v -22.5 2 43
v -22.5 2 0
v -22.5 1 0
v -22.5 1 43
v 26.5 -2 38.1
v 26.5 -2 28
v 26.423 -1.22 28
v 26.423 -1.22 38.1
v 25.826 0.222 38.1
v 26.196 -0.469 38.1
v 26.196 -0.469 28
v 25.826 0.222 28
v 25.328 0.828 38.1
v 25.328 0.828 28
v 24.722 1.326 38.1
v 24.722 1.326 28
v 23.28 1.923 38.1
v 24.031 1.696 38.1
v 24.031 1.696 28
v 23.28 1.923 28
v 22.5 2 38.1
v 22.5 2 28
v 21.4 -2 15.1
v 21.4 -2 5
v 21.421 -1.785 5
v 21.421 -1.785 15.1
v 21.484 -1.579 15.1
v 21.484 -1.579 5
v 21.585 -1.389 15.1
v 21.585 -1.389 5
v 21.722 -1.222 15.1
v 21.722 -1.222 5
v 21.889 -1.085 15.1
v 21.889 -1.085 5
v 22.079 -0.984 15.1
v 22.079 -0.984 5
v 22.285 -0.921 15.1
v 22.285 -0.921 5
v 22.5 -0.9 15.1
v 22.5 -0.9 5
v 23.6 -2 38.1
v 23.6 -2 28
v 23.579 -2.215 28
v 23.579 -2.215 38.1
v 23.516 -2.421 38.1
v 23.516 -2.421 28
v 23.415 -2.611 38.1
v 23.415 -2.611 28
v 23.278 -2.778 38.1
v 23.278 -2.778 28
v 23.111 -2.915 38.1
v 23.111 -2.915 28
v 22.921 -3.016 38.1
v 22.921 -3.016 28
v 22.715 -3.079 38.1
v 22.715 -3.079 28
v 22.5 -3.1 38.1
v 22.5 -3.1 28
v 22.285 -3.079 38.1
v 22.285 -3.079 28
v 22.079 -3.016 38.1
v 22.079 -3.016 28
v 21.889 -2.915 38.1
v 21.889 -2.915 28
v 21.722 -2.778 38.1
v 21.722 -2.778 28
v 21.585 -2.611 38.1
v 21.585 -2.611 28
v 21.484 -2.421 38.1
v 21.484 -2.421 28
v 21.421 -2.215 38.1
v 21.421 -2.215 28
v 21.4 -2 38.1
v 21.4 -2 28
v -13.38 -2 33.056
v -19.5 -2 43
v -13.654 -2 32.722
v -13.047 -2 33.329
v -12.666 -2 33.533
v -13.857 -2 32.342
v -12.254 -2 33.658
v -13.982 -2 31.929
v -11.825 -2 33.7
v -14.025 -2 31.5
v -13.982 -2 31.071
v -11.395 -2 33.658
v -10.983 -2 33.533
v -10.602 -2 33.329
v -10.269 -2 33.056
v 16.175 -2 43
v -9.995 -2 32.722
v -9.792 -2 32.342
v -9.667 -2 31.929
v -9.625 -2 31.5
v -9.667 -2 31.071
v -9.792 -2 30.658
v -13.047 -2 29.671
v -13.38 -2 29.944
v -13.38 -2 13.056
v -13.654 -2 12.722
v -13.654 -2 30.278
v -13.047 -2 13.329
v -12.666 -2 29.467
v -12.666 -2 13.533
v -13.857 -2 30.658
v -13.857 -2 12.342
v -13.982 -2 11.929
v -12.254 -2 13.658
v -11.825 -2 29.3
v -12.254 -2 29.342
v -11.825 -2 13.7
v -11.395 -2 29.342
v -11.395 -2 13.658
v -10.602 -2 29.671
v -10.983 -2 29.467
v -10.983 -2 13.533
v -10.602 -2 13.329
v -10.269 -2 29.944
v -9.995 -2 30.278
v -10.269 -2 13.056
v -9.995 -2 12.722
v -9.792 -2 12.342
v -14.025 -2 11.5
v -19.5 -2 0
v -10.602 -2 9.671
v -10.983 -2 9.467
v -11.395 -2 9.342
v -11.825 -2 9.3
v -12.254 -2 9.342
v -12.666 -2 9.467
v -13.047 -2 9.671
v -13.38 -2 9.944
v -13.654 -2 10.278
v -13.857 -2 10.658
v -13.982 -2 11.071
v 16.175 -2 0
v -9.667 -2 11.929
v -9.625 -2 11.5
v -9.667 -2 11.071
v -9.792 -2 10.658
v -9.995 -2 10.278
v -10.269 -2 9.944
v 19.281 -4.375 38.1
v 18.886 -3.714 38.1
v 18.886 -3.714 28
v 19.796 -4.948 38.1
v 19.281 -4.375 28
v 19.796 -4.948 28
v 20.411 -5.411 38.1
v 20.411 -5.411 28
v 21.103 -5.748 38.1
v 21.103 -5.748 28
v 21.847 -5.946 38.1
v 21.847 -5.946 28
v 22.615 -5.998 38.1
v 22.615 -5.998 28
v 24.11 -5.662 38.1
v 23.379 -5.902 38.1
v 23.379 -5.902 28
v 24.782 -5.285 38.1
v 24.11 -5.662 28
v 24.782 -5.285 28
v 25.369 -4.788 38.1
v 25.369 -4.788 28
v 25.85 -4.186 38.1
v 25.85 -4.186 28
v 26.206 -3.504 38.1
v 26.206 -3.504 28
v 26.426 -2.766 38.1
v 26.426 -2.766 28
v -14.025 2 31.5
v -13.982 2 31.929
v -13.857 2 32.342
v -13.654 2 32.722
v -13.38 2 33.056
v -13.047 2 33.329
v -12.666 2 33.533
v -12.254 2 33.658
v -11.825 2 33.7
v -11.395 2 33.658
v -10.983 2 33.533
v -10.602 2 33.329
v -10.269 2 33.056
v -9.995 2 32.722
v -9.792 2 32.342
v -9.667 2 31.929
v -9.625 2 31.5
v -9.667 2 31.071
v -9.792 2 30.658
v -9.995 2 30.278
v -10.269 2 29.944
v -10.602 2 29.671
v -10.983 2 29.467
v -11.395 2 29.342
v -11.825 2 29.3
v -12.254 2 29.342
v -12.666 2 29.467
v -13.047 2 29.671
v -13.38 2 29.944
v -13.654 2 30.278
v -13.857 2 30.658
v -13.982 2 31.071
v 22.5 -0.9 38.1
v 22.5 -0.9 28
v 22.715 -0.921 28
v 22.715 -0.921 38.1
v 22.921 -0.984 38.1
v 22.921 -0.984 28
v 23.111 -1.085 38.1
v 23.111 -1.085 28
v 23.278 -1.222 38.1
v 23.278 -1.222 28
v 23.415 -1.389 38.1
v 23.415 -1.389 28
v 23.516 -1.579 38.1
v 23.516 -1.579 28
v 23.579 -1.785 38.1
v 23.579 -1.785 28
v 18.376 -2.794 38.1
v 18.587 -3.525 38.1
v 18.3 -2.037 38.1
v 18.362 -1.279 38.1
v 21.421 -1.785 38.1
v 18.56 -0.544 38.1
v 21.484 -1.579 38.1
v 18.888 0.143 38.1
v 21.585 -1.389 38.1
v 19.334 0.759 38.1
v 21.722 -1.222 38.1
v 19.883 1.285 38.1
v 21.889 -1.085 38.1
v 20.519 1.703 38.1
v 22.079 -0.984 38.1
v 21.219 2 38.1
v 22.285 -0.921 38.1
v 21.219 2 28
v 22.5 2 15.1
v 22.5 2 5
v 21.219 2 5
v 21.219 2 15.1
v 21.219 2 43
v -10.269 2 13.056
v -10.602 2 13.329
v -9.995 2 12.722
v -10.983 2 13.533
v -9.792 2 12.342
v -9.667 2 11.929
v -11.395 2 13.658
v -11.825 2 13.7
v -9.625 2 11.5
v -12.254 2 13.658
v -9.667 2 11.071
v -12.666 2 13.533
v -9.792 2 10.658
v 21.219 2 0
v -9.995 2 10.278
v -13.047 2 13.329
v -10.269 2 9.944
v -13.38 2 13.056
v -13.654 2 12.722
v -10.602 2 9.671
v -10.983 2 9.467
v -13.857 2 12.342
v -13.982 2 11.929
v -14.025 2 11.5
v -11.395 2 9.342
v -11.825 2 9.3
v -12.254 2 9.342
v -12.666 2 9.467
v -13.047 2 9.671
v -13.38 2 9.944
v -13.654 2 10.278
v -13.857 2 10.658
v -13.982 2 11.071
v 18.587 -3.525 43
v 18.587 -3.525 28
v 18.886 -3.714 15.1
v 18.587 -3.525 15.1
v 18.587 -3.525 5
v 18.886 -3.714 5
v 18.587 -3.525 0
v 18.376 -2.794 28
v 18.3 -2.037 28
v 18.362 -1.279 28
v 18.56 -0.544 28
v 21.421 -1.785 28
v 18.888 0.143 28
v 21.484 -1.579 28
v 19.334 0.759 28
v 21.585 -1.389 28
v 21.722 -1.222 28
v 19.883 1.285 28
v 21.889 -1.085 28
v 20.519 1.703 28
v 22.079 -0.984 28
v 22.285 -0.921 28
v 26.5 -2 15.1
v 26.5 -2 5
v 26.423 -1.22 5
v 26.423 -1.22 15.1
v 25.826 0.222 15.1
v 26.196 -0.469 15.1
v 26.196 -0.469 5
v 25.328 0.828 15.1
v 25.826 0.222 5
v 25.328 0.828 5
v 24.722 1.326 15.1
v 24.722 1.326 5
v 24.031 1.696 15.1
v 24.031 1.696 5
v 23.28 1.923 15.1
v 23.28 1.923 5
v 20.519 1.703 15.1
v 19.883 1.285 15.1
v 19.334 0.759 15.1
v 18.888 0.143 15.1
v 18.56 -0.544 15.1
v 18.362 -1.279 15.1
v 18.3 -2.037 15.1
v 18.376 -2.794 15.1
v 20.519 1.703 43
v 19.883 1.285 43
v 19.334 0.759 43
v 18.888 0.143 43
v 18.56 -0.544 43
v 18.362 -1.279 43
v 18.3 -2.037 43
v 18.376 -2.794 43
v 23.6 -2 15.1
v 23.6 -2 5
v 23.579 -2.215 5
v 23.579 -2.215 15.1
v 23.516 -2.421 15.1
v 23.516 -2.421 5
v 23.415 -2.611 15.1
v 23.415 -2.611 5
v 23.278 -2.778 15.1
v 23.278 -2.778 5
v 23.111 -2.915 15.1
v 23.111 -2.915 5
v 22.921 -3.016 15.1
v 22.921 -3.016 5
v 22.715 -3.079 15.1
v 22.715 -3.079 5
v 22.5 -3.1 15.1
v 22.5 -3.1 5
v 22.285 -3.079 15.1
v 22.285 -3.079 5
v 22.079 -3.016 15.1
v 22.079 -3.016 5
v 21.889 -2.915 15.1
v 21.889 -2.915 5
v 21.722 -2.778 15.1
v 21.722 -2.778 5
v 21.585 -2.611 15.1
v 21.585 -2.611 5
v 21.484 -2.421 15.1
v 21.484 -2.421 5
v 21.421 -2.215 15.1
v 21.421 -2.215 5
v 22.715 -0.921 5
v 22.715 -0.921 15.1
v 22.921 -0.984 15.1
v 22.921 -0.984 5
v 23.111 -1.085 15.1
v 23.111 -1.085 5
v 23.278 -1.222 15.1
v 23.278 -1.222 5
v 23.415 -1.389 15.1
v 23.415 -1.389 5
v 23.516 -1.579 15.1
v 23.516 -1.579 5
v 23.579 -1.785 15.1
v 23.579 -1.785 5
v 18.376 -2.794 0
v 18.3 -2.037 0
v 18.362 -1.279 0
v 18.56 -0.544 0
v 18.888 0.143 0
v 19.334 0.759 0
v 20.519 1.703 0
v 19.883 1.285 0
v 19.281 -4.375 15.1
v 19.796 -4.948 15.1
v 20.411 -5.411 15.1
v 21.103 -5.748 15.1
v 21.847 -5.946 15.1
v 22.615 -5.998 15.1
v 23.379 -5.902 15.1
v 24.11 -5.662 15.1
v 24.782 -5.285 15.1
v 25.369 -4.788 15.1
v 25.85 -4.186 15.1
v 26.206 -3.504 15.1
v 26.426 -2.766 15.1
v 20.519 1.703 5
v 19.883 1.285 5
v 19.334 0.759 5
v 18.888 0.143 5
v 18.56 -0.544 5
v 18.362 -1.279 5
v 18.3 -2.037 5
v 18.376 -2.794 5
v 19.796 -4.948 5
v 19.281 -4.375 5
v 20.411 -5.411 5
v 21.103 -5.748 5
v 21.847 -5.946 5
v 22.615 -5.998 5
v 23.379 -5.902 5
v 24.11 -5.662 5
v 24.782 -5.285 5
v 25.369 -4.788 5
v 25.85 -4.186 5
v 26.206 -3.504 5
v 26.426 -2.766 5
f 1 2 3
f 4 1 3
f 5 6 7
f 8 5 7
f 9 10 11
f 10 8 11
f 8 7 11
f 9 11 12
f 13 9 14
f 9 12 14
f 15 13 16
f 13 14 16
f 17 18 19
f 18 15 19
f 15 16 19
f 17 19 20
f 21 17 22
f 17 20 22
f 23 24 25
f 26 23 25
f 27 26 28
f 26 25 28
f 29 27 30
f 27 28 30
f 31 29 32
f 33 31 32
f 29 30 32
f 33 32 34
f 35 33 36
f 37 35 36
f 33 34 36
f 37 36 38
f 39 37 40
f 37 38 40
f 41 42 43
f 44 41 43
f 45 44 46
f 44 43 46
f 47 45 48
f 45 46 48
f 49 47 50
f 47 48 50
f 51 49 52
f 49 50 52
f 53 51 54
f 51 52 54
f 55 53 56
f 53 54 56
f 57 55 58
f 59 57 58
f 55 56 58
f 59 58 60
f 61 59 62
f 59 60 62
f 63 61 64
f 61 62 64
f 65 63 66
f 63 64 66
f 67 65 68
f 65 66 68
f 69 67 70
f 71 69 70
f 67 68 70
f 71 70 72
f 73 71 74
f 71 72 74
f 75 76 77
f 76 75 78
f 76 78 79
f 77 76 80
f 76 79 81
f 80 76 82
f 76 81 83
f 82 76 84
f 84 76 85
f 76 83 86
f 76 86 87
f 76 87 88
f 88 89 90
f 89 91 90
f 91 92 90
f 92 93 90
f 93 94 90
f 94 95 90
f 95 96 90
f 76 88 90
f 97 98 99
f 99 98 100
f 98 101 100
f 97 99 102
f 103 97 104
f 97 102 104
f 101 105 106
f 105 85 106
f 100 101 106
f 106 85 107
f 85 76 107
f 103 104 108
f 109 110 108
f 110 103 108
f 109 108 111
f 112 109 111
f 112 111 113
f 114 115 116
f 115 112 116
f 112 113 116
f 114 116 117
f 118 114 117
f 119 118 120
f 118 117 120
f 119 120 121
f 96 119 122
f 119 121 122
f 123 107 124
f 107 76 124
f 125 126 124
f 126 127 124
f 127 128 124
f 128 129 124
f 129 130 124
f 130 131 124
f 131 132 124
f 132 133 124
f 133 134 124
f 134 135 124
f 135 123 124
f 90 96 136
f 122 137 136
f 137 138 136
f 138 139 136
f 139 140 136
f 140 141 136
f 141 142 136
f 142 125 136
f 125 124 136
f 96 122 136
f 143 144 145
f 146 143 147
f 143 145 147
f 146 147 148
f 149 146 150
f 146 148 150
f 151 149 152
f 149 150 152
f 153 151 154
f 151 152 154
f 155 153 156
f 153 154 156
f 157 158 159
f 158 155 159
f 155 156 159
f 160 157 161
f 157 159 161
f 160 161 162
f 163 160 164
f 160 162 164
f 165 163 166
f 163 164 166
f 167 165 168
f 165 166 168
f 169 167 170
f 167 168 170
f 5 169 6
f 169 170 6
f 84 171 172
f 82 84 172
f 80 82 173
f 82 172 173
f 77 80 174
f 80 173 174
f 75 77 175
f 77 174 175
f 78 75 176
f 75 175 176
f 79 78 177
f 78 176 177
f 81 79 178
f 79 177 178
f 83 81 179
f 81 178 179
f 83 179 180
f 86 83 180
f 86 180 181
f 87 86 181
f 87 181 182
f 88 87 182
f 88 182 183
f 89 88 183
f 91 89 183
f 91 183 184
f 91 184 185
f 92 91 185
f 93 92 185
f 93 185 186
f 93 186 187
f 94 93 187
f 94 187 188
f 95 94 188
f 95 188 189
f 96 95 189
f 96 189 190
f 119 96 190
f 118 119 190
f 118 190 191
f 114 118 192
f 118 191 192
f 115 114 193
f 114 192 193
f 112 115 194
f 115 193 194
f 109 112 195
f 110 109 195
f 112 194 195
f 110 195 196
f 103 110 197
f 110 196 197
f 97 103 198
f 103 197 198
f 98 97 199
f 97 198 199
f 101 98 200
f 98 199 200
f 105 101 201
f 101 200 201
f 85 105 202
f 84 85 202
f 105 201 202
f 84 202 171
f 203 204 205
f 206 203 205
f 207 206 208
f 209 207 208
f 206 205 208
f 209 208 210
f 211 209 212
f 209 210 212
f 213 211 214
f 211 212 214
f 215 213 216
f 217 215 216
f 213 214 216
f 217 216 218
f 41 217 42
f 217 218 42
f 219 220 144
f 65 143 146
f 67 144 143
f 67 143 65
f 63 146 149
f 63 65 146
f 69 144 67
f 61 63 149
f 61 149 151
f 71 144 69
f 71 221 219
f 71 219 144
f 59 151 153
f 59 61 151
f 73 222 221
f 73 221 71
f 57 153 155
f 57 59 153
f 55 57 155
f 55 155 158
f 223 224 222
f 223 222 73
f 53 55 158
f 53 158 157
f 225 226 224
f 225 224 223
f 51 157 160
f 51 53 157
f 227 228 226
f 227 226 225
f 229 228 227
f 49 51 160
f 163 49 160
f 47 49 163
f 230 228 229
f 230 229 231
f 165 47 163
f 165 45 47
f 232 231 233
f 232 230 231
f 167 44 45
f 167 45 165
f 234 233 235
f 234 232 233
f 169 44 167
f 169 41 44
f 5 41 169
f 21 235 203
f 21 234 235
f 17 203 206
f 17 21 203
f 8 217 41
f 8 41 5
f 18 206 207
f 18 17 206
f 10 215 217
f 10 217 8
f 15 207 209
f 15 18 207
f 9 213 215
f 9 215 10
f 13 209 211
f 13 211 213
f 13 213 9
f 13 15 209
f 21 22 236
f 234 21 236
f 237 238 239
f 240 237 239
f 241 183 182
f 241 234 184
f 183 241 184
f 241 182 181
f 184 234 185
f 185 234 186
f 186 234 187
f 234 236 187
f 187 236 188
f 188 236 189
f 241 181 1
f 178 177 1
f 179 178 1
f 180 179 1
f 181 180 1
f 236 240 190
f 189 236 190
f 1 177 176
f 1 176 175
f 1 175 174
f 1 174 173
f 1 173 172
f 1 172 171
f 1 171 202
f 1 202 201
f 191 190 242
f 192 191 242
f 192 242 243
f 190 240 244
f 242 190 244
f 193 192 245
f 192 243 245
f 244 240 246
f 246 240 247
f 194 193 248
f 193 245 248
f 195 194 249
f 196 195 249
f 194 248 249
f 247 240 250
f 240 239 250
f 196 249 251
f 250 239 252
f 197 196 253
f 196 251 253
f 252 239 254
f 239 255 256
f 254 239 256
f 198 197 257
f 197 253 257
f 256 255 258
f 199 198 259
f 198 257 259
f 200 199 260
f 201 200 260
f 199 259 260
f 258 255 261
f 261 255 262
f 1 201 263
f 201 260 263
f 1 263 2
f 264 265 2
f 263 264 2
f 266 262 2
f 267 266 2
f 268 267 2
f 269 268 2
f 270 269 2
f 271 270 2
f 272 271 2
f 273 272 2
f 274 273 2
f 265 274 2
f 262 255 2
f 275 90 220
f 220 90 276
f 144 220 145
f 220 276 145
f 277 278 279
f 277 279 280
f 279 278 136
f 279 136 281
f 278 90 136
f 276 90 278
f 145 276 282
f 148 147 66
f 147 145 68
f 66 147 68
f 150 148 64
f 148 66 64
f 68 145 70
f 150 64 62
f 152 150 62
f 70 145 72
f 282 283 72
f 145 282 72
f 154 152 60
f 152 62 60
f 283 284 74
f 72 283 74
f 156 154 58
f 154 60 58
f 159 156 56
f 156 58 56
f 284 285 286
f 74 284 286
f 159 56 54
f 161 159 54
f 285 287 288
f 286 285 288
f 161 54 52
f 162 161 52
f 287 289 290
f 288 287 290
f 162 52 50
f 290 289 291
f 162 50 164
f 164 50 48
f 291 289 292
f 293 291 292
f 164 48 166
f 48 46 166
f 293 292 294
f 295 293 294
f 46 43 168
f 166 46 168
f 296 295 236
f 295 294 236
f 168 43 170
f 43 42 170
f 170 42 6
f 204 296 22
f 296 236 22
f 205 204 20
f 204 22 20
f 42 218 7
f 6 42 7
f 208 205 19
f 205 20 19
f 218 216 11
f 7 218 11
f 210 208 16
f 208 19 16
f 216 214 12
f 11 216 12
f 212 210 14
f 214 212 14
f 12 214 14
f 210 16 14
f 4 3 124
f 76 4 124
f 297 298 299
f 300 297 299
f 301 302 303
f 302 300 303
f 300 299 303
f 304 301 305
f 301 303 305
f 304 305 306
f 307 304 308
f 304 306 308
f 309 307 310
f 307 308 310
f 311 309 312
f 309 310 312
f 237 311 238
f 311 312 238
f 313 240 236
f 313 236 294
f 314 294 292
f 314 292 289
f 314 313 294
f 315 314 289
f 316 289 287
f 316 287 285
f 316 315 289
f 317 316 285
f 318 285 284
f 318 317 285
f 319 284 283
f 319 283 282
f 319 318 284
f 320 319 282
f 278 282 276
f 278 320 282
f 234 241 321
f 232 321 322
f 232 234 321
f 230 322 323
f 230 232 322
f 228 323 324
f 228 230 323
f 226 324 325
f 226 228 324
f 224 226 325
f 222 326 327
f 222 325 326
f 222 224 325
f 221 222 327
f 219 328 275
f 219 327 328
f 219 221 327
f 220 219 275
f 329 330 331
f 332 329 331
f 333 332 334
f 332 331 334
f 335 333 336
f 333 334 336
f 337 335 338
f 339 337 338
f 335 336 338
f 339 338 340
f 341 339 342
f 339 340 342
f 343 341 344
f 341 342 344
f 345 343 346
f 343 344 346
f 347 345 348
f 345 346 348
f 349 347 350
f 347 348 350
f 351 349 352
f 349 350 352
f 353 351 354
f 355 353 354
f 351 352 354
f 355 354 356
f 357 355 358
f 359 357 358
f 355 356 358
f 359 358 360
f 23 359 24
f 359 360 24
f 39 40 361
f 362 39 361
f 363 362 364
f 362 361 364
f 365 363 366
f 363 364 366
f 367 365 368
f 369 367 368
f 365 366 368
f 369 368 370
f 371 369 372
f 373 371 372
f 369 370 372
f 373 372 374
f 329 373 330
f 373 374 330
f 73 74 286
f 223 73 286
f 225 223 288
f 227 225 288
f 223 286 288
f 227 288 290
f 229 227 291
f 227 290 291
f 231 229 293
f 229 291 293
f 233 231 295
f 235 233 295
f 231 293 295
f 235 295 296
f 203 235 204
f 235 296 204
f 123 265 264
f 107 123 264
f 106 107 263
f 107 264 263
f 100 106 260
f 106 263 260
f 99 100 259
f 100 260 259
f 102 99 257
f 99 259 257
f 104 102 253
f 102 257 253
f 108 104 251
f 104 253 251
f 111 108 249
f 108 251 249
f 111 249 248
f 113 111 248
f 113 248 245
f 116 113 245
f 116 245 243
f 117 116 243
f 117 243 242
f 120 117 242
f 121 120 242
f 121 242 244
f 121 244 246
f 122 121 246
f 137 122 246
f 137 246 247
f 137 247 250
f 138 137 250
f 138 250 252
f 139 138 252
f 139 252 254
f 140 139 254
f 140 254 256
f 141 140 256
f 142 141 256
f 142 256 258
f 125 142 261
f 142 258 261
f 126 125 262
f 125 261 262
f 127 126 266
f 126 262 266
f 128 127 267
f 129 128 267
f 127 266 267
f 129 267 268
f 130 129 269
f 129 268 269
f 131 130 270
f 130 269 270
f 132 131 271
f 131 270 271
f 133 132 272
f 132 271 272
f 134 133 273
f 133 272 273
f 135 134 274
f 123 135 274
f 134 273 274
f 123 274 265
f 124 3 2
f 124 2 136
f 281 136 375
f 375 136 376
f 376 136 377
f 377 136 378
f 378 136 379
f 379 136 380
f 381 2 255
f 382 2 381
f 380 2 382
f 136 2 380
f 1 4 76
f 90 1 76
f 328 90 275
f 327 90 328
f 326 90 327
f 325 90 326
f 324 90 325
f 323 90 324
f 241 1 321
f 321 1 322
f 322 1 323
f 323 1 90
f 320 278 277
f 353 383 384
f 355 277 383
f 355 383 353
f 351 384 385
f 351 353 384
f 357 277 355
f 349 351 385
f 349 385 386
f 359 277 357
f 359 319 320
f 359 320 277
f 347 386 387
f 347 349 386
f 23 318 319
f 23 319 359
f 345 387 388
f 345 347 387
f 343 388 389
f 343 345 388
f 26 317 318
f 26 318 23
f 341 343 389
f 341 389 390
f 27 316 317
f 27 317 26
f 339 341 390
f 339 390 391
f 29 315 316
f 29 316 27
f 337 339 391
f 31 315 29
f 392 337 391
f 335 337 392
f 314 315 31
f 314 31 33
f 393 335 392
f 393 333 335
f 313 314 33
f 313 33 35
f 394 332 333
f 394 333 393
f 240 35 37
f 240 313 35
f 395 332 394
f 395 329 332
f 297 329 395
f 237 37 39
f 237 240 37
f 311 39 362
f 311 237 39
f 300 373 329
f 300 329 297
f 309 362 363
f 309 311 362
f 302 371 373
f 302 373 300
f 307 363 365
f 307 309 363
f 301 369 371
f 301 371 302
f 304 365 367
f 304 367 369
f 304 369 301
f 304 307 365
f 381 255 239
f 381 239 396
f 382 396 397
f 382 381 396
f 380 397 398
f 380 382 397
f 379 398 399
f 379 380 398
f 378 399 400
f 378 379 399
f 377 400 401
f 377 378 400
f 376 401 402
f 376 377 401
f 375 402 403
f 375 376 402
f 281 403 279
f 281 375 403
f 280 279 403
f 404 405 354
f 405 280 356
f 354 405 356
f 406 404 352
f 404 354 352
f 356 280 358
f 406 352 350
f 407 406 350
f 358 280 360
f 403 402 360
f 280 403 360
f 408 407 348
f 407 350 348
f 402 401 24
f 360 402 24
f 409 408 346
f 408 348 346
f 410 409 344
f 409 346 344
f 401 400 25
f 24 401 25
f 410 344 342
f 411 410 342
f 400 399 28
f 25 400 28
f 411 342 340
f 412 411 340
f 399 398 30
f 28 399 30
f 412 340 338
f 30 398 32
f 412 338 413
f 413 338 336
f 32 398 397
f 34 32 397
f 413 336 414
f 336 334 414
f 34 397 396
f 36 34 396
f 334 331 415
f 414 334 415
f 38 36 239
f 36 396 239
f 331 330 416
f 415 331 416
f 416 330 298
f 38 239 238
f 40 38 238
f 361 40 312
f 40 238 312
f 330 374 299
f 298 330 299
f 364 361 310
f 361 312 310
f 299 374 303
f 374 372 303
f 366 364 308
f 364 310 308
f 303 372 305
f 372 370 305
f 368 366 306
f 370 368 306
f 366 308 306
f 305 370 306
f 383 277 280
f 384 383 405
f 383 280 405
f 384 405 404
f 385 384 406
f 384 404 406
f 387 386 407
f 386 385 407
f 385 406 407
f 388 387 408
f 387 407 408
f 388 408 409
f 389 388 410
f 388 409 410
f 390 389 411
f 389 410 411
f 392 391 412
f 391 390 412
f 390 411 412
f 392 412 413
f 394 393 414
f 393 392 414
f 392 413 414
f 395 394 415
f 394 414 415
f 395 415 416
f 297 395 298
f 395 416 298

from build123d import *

# Parameters (mm, degrees)
F1_DEPTH    = 43
F2_T1_DEPTH = 43
F2_T3_DEPTH = 58.4300979278
F4_D        = 4.4
F5_R        = 4.2
F6_DEPTH    = 5
F7_START    = 15.1
F7_DEPTH    = 12.9
F8_START    = 38.1
F8_DEPTH    = 11.9


# Not quite as in the source:
# - a fillet or chamfer that OpenCascade refuses, or shapes differently, is made with other operations: its cross-section is extruded or revolved along the edge and cut away or added


with BuildPart() as f1:
    # F0 (on Top) → F1 (new body)
    with BuildSketch(Plane.XY):
        with BuildLine():
            Line((-22.5, -2), (18.5, -2))
            ThreePointArc((18.5, -2), (19.6715728753, 0.8284271247), (22.5, 2))
            Line((22.5, 2), (-22.5, 2))
            Line((-22.5, 2), (-22.5, -2))
        make_face()
        with BuildLine():
            Line((18.5, -2), (21.4, -2))
            ThreePointArc((21.4, -2), (21.7221825407, -1.2221825407), (22.5, -0.9))
            Line((22.5, -0.9), (22.5, 2))
            ThreePointArc((22.5, 2), (19.6715728753, 0.8284271247), (18.5, -2))
        make_face()
        with BuildLine():
            ThreePointArc((23.6, -2), (22.5, -3.1), (21.4, -2))
            Line((21.4, -2), (18.5, -2))
            ThreePointArc((18.5, -2), (22.5, -6), (26.5, -2))
            ThreePointArc((26.5, -2), (25.3284271247, 0.8284271247), (22.5, 2))
            Line((22.5, 2), (22.5, -0.9))
            ThreePointArc((22.5, -0.9), (23.2778174593, -1.2221825407), (23.6, -2))
        make_face()
    extrude(amount=F1_DEPTH)

    # F2: chamfer of 3 on 2 edges, made by hand

    # F2_s2 → F2_t1 (join)
    with BuildSketch(Plane.XY):
        with BuildLine():
            Line((16.0740261691, -1.9358573019), (18.9873868989, -3.7784284123))
            Line((18.9873868989, -3.7784284123), (19.0415973731, -3.7527141266))
            ThreePointArc((19.0415973731, -3.7527141266), (18.6659635809, -2.9076148618), (18.56, -2))
            Line((18.56, -2), (18.5, -1.94))
            ThreePointArc((18.5, -1.94), (17.2870130845, -1.94), (16.0740261691, -1.8758573019))
            Line((16.0740261691, -1.8758573019), (16.0740261691, -1.9358573019))
        make_face()
    extrude(amount=F2_T1_DEPTH)

    # F2_s4 → F2_t3 (cut)
    with BuildSketch(Plane.XY.offset(-7.7150489639)):
        with BuildLine():
            Line((-22.5848528137, 1.0848528137), (-19.4151471863, -2.0848528137))
            Line((-19.4151471863, -2.0848528137), (-19.4151471863, -2.1448528137))
            ThreePointArc((-19.4151471863, -2.1448528137), (-20.9575735931, -2.06), (-22.5, -2.06))
            Line((-22.5, -2.06), (-22.56, -2))
            ThreePointArc((-22.56, -2), (-22.56, -0.4575735931), (-22.6448528137, 1.0848528137))
            Line((-22.6448528137, 1.0848528137), (-22.5848528137, 1.0848528137))
        make_face()
    extrude(amount=F2_T3_DEPTH, mode=Mode.SUBTRACT)

    # F4 (through all)
    with Locations(Plane.XZ.offset(2)):
        with Locations((-11.8245553203, 31.5), (-11.8245553203, 11.5)):
            Hole(F4_D / 2)

    # F5 (on face) → F6 (cut)
    with BuildSketch(Plane.XY):
        with Locations((22.5, -2)):
            Circle(F5_R)
    extrude(amount=F6_DEPTH, mode=Mode.SUBTRACT)

    # F5 (on face) → F7 (cut)
    with BuildSketch(Plane.XY.offset(F7_START)):
        with Locations((22.5, -2)):
            Circle(F5_R)
    extrude(amount=F7_DEPTH, mode=Mode.SUBTRACT)

    # F5 (on face) → F8 (cut)
    with BuildSketch(Plane.XY.offset(F8_START)):
        with Locations((22.5, -2)):
            Circle(F5_R)
    extrude(amount=F8_DEPTH, mode=Mode.SUBTRACT)


solid = f1.part
